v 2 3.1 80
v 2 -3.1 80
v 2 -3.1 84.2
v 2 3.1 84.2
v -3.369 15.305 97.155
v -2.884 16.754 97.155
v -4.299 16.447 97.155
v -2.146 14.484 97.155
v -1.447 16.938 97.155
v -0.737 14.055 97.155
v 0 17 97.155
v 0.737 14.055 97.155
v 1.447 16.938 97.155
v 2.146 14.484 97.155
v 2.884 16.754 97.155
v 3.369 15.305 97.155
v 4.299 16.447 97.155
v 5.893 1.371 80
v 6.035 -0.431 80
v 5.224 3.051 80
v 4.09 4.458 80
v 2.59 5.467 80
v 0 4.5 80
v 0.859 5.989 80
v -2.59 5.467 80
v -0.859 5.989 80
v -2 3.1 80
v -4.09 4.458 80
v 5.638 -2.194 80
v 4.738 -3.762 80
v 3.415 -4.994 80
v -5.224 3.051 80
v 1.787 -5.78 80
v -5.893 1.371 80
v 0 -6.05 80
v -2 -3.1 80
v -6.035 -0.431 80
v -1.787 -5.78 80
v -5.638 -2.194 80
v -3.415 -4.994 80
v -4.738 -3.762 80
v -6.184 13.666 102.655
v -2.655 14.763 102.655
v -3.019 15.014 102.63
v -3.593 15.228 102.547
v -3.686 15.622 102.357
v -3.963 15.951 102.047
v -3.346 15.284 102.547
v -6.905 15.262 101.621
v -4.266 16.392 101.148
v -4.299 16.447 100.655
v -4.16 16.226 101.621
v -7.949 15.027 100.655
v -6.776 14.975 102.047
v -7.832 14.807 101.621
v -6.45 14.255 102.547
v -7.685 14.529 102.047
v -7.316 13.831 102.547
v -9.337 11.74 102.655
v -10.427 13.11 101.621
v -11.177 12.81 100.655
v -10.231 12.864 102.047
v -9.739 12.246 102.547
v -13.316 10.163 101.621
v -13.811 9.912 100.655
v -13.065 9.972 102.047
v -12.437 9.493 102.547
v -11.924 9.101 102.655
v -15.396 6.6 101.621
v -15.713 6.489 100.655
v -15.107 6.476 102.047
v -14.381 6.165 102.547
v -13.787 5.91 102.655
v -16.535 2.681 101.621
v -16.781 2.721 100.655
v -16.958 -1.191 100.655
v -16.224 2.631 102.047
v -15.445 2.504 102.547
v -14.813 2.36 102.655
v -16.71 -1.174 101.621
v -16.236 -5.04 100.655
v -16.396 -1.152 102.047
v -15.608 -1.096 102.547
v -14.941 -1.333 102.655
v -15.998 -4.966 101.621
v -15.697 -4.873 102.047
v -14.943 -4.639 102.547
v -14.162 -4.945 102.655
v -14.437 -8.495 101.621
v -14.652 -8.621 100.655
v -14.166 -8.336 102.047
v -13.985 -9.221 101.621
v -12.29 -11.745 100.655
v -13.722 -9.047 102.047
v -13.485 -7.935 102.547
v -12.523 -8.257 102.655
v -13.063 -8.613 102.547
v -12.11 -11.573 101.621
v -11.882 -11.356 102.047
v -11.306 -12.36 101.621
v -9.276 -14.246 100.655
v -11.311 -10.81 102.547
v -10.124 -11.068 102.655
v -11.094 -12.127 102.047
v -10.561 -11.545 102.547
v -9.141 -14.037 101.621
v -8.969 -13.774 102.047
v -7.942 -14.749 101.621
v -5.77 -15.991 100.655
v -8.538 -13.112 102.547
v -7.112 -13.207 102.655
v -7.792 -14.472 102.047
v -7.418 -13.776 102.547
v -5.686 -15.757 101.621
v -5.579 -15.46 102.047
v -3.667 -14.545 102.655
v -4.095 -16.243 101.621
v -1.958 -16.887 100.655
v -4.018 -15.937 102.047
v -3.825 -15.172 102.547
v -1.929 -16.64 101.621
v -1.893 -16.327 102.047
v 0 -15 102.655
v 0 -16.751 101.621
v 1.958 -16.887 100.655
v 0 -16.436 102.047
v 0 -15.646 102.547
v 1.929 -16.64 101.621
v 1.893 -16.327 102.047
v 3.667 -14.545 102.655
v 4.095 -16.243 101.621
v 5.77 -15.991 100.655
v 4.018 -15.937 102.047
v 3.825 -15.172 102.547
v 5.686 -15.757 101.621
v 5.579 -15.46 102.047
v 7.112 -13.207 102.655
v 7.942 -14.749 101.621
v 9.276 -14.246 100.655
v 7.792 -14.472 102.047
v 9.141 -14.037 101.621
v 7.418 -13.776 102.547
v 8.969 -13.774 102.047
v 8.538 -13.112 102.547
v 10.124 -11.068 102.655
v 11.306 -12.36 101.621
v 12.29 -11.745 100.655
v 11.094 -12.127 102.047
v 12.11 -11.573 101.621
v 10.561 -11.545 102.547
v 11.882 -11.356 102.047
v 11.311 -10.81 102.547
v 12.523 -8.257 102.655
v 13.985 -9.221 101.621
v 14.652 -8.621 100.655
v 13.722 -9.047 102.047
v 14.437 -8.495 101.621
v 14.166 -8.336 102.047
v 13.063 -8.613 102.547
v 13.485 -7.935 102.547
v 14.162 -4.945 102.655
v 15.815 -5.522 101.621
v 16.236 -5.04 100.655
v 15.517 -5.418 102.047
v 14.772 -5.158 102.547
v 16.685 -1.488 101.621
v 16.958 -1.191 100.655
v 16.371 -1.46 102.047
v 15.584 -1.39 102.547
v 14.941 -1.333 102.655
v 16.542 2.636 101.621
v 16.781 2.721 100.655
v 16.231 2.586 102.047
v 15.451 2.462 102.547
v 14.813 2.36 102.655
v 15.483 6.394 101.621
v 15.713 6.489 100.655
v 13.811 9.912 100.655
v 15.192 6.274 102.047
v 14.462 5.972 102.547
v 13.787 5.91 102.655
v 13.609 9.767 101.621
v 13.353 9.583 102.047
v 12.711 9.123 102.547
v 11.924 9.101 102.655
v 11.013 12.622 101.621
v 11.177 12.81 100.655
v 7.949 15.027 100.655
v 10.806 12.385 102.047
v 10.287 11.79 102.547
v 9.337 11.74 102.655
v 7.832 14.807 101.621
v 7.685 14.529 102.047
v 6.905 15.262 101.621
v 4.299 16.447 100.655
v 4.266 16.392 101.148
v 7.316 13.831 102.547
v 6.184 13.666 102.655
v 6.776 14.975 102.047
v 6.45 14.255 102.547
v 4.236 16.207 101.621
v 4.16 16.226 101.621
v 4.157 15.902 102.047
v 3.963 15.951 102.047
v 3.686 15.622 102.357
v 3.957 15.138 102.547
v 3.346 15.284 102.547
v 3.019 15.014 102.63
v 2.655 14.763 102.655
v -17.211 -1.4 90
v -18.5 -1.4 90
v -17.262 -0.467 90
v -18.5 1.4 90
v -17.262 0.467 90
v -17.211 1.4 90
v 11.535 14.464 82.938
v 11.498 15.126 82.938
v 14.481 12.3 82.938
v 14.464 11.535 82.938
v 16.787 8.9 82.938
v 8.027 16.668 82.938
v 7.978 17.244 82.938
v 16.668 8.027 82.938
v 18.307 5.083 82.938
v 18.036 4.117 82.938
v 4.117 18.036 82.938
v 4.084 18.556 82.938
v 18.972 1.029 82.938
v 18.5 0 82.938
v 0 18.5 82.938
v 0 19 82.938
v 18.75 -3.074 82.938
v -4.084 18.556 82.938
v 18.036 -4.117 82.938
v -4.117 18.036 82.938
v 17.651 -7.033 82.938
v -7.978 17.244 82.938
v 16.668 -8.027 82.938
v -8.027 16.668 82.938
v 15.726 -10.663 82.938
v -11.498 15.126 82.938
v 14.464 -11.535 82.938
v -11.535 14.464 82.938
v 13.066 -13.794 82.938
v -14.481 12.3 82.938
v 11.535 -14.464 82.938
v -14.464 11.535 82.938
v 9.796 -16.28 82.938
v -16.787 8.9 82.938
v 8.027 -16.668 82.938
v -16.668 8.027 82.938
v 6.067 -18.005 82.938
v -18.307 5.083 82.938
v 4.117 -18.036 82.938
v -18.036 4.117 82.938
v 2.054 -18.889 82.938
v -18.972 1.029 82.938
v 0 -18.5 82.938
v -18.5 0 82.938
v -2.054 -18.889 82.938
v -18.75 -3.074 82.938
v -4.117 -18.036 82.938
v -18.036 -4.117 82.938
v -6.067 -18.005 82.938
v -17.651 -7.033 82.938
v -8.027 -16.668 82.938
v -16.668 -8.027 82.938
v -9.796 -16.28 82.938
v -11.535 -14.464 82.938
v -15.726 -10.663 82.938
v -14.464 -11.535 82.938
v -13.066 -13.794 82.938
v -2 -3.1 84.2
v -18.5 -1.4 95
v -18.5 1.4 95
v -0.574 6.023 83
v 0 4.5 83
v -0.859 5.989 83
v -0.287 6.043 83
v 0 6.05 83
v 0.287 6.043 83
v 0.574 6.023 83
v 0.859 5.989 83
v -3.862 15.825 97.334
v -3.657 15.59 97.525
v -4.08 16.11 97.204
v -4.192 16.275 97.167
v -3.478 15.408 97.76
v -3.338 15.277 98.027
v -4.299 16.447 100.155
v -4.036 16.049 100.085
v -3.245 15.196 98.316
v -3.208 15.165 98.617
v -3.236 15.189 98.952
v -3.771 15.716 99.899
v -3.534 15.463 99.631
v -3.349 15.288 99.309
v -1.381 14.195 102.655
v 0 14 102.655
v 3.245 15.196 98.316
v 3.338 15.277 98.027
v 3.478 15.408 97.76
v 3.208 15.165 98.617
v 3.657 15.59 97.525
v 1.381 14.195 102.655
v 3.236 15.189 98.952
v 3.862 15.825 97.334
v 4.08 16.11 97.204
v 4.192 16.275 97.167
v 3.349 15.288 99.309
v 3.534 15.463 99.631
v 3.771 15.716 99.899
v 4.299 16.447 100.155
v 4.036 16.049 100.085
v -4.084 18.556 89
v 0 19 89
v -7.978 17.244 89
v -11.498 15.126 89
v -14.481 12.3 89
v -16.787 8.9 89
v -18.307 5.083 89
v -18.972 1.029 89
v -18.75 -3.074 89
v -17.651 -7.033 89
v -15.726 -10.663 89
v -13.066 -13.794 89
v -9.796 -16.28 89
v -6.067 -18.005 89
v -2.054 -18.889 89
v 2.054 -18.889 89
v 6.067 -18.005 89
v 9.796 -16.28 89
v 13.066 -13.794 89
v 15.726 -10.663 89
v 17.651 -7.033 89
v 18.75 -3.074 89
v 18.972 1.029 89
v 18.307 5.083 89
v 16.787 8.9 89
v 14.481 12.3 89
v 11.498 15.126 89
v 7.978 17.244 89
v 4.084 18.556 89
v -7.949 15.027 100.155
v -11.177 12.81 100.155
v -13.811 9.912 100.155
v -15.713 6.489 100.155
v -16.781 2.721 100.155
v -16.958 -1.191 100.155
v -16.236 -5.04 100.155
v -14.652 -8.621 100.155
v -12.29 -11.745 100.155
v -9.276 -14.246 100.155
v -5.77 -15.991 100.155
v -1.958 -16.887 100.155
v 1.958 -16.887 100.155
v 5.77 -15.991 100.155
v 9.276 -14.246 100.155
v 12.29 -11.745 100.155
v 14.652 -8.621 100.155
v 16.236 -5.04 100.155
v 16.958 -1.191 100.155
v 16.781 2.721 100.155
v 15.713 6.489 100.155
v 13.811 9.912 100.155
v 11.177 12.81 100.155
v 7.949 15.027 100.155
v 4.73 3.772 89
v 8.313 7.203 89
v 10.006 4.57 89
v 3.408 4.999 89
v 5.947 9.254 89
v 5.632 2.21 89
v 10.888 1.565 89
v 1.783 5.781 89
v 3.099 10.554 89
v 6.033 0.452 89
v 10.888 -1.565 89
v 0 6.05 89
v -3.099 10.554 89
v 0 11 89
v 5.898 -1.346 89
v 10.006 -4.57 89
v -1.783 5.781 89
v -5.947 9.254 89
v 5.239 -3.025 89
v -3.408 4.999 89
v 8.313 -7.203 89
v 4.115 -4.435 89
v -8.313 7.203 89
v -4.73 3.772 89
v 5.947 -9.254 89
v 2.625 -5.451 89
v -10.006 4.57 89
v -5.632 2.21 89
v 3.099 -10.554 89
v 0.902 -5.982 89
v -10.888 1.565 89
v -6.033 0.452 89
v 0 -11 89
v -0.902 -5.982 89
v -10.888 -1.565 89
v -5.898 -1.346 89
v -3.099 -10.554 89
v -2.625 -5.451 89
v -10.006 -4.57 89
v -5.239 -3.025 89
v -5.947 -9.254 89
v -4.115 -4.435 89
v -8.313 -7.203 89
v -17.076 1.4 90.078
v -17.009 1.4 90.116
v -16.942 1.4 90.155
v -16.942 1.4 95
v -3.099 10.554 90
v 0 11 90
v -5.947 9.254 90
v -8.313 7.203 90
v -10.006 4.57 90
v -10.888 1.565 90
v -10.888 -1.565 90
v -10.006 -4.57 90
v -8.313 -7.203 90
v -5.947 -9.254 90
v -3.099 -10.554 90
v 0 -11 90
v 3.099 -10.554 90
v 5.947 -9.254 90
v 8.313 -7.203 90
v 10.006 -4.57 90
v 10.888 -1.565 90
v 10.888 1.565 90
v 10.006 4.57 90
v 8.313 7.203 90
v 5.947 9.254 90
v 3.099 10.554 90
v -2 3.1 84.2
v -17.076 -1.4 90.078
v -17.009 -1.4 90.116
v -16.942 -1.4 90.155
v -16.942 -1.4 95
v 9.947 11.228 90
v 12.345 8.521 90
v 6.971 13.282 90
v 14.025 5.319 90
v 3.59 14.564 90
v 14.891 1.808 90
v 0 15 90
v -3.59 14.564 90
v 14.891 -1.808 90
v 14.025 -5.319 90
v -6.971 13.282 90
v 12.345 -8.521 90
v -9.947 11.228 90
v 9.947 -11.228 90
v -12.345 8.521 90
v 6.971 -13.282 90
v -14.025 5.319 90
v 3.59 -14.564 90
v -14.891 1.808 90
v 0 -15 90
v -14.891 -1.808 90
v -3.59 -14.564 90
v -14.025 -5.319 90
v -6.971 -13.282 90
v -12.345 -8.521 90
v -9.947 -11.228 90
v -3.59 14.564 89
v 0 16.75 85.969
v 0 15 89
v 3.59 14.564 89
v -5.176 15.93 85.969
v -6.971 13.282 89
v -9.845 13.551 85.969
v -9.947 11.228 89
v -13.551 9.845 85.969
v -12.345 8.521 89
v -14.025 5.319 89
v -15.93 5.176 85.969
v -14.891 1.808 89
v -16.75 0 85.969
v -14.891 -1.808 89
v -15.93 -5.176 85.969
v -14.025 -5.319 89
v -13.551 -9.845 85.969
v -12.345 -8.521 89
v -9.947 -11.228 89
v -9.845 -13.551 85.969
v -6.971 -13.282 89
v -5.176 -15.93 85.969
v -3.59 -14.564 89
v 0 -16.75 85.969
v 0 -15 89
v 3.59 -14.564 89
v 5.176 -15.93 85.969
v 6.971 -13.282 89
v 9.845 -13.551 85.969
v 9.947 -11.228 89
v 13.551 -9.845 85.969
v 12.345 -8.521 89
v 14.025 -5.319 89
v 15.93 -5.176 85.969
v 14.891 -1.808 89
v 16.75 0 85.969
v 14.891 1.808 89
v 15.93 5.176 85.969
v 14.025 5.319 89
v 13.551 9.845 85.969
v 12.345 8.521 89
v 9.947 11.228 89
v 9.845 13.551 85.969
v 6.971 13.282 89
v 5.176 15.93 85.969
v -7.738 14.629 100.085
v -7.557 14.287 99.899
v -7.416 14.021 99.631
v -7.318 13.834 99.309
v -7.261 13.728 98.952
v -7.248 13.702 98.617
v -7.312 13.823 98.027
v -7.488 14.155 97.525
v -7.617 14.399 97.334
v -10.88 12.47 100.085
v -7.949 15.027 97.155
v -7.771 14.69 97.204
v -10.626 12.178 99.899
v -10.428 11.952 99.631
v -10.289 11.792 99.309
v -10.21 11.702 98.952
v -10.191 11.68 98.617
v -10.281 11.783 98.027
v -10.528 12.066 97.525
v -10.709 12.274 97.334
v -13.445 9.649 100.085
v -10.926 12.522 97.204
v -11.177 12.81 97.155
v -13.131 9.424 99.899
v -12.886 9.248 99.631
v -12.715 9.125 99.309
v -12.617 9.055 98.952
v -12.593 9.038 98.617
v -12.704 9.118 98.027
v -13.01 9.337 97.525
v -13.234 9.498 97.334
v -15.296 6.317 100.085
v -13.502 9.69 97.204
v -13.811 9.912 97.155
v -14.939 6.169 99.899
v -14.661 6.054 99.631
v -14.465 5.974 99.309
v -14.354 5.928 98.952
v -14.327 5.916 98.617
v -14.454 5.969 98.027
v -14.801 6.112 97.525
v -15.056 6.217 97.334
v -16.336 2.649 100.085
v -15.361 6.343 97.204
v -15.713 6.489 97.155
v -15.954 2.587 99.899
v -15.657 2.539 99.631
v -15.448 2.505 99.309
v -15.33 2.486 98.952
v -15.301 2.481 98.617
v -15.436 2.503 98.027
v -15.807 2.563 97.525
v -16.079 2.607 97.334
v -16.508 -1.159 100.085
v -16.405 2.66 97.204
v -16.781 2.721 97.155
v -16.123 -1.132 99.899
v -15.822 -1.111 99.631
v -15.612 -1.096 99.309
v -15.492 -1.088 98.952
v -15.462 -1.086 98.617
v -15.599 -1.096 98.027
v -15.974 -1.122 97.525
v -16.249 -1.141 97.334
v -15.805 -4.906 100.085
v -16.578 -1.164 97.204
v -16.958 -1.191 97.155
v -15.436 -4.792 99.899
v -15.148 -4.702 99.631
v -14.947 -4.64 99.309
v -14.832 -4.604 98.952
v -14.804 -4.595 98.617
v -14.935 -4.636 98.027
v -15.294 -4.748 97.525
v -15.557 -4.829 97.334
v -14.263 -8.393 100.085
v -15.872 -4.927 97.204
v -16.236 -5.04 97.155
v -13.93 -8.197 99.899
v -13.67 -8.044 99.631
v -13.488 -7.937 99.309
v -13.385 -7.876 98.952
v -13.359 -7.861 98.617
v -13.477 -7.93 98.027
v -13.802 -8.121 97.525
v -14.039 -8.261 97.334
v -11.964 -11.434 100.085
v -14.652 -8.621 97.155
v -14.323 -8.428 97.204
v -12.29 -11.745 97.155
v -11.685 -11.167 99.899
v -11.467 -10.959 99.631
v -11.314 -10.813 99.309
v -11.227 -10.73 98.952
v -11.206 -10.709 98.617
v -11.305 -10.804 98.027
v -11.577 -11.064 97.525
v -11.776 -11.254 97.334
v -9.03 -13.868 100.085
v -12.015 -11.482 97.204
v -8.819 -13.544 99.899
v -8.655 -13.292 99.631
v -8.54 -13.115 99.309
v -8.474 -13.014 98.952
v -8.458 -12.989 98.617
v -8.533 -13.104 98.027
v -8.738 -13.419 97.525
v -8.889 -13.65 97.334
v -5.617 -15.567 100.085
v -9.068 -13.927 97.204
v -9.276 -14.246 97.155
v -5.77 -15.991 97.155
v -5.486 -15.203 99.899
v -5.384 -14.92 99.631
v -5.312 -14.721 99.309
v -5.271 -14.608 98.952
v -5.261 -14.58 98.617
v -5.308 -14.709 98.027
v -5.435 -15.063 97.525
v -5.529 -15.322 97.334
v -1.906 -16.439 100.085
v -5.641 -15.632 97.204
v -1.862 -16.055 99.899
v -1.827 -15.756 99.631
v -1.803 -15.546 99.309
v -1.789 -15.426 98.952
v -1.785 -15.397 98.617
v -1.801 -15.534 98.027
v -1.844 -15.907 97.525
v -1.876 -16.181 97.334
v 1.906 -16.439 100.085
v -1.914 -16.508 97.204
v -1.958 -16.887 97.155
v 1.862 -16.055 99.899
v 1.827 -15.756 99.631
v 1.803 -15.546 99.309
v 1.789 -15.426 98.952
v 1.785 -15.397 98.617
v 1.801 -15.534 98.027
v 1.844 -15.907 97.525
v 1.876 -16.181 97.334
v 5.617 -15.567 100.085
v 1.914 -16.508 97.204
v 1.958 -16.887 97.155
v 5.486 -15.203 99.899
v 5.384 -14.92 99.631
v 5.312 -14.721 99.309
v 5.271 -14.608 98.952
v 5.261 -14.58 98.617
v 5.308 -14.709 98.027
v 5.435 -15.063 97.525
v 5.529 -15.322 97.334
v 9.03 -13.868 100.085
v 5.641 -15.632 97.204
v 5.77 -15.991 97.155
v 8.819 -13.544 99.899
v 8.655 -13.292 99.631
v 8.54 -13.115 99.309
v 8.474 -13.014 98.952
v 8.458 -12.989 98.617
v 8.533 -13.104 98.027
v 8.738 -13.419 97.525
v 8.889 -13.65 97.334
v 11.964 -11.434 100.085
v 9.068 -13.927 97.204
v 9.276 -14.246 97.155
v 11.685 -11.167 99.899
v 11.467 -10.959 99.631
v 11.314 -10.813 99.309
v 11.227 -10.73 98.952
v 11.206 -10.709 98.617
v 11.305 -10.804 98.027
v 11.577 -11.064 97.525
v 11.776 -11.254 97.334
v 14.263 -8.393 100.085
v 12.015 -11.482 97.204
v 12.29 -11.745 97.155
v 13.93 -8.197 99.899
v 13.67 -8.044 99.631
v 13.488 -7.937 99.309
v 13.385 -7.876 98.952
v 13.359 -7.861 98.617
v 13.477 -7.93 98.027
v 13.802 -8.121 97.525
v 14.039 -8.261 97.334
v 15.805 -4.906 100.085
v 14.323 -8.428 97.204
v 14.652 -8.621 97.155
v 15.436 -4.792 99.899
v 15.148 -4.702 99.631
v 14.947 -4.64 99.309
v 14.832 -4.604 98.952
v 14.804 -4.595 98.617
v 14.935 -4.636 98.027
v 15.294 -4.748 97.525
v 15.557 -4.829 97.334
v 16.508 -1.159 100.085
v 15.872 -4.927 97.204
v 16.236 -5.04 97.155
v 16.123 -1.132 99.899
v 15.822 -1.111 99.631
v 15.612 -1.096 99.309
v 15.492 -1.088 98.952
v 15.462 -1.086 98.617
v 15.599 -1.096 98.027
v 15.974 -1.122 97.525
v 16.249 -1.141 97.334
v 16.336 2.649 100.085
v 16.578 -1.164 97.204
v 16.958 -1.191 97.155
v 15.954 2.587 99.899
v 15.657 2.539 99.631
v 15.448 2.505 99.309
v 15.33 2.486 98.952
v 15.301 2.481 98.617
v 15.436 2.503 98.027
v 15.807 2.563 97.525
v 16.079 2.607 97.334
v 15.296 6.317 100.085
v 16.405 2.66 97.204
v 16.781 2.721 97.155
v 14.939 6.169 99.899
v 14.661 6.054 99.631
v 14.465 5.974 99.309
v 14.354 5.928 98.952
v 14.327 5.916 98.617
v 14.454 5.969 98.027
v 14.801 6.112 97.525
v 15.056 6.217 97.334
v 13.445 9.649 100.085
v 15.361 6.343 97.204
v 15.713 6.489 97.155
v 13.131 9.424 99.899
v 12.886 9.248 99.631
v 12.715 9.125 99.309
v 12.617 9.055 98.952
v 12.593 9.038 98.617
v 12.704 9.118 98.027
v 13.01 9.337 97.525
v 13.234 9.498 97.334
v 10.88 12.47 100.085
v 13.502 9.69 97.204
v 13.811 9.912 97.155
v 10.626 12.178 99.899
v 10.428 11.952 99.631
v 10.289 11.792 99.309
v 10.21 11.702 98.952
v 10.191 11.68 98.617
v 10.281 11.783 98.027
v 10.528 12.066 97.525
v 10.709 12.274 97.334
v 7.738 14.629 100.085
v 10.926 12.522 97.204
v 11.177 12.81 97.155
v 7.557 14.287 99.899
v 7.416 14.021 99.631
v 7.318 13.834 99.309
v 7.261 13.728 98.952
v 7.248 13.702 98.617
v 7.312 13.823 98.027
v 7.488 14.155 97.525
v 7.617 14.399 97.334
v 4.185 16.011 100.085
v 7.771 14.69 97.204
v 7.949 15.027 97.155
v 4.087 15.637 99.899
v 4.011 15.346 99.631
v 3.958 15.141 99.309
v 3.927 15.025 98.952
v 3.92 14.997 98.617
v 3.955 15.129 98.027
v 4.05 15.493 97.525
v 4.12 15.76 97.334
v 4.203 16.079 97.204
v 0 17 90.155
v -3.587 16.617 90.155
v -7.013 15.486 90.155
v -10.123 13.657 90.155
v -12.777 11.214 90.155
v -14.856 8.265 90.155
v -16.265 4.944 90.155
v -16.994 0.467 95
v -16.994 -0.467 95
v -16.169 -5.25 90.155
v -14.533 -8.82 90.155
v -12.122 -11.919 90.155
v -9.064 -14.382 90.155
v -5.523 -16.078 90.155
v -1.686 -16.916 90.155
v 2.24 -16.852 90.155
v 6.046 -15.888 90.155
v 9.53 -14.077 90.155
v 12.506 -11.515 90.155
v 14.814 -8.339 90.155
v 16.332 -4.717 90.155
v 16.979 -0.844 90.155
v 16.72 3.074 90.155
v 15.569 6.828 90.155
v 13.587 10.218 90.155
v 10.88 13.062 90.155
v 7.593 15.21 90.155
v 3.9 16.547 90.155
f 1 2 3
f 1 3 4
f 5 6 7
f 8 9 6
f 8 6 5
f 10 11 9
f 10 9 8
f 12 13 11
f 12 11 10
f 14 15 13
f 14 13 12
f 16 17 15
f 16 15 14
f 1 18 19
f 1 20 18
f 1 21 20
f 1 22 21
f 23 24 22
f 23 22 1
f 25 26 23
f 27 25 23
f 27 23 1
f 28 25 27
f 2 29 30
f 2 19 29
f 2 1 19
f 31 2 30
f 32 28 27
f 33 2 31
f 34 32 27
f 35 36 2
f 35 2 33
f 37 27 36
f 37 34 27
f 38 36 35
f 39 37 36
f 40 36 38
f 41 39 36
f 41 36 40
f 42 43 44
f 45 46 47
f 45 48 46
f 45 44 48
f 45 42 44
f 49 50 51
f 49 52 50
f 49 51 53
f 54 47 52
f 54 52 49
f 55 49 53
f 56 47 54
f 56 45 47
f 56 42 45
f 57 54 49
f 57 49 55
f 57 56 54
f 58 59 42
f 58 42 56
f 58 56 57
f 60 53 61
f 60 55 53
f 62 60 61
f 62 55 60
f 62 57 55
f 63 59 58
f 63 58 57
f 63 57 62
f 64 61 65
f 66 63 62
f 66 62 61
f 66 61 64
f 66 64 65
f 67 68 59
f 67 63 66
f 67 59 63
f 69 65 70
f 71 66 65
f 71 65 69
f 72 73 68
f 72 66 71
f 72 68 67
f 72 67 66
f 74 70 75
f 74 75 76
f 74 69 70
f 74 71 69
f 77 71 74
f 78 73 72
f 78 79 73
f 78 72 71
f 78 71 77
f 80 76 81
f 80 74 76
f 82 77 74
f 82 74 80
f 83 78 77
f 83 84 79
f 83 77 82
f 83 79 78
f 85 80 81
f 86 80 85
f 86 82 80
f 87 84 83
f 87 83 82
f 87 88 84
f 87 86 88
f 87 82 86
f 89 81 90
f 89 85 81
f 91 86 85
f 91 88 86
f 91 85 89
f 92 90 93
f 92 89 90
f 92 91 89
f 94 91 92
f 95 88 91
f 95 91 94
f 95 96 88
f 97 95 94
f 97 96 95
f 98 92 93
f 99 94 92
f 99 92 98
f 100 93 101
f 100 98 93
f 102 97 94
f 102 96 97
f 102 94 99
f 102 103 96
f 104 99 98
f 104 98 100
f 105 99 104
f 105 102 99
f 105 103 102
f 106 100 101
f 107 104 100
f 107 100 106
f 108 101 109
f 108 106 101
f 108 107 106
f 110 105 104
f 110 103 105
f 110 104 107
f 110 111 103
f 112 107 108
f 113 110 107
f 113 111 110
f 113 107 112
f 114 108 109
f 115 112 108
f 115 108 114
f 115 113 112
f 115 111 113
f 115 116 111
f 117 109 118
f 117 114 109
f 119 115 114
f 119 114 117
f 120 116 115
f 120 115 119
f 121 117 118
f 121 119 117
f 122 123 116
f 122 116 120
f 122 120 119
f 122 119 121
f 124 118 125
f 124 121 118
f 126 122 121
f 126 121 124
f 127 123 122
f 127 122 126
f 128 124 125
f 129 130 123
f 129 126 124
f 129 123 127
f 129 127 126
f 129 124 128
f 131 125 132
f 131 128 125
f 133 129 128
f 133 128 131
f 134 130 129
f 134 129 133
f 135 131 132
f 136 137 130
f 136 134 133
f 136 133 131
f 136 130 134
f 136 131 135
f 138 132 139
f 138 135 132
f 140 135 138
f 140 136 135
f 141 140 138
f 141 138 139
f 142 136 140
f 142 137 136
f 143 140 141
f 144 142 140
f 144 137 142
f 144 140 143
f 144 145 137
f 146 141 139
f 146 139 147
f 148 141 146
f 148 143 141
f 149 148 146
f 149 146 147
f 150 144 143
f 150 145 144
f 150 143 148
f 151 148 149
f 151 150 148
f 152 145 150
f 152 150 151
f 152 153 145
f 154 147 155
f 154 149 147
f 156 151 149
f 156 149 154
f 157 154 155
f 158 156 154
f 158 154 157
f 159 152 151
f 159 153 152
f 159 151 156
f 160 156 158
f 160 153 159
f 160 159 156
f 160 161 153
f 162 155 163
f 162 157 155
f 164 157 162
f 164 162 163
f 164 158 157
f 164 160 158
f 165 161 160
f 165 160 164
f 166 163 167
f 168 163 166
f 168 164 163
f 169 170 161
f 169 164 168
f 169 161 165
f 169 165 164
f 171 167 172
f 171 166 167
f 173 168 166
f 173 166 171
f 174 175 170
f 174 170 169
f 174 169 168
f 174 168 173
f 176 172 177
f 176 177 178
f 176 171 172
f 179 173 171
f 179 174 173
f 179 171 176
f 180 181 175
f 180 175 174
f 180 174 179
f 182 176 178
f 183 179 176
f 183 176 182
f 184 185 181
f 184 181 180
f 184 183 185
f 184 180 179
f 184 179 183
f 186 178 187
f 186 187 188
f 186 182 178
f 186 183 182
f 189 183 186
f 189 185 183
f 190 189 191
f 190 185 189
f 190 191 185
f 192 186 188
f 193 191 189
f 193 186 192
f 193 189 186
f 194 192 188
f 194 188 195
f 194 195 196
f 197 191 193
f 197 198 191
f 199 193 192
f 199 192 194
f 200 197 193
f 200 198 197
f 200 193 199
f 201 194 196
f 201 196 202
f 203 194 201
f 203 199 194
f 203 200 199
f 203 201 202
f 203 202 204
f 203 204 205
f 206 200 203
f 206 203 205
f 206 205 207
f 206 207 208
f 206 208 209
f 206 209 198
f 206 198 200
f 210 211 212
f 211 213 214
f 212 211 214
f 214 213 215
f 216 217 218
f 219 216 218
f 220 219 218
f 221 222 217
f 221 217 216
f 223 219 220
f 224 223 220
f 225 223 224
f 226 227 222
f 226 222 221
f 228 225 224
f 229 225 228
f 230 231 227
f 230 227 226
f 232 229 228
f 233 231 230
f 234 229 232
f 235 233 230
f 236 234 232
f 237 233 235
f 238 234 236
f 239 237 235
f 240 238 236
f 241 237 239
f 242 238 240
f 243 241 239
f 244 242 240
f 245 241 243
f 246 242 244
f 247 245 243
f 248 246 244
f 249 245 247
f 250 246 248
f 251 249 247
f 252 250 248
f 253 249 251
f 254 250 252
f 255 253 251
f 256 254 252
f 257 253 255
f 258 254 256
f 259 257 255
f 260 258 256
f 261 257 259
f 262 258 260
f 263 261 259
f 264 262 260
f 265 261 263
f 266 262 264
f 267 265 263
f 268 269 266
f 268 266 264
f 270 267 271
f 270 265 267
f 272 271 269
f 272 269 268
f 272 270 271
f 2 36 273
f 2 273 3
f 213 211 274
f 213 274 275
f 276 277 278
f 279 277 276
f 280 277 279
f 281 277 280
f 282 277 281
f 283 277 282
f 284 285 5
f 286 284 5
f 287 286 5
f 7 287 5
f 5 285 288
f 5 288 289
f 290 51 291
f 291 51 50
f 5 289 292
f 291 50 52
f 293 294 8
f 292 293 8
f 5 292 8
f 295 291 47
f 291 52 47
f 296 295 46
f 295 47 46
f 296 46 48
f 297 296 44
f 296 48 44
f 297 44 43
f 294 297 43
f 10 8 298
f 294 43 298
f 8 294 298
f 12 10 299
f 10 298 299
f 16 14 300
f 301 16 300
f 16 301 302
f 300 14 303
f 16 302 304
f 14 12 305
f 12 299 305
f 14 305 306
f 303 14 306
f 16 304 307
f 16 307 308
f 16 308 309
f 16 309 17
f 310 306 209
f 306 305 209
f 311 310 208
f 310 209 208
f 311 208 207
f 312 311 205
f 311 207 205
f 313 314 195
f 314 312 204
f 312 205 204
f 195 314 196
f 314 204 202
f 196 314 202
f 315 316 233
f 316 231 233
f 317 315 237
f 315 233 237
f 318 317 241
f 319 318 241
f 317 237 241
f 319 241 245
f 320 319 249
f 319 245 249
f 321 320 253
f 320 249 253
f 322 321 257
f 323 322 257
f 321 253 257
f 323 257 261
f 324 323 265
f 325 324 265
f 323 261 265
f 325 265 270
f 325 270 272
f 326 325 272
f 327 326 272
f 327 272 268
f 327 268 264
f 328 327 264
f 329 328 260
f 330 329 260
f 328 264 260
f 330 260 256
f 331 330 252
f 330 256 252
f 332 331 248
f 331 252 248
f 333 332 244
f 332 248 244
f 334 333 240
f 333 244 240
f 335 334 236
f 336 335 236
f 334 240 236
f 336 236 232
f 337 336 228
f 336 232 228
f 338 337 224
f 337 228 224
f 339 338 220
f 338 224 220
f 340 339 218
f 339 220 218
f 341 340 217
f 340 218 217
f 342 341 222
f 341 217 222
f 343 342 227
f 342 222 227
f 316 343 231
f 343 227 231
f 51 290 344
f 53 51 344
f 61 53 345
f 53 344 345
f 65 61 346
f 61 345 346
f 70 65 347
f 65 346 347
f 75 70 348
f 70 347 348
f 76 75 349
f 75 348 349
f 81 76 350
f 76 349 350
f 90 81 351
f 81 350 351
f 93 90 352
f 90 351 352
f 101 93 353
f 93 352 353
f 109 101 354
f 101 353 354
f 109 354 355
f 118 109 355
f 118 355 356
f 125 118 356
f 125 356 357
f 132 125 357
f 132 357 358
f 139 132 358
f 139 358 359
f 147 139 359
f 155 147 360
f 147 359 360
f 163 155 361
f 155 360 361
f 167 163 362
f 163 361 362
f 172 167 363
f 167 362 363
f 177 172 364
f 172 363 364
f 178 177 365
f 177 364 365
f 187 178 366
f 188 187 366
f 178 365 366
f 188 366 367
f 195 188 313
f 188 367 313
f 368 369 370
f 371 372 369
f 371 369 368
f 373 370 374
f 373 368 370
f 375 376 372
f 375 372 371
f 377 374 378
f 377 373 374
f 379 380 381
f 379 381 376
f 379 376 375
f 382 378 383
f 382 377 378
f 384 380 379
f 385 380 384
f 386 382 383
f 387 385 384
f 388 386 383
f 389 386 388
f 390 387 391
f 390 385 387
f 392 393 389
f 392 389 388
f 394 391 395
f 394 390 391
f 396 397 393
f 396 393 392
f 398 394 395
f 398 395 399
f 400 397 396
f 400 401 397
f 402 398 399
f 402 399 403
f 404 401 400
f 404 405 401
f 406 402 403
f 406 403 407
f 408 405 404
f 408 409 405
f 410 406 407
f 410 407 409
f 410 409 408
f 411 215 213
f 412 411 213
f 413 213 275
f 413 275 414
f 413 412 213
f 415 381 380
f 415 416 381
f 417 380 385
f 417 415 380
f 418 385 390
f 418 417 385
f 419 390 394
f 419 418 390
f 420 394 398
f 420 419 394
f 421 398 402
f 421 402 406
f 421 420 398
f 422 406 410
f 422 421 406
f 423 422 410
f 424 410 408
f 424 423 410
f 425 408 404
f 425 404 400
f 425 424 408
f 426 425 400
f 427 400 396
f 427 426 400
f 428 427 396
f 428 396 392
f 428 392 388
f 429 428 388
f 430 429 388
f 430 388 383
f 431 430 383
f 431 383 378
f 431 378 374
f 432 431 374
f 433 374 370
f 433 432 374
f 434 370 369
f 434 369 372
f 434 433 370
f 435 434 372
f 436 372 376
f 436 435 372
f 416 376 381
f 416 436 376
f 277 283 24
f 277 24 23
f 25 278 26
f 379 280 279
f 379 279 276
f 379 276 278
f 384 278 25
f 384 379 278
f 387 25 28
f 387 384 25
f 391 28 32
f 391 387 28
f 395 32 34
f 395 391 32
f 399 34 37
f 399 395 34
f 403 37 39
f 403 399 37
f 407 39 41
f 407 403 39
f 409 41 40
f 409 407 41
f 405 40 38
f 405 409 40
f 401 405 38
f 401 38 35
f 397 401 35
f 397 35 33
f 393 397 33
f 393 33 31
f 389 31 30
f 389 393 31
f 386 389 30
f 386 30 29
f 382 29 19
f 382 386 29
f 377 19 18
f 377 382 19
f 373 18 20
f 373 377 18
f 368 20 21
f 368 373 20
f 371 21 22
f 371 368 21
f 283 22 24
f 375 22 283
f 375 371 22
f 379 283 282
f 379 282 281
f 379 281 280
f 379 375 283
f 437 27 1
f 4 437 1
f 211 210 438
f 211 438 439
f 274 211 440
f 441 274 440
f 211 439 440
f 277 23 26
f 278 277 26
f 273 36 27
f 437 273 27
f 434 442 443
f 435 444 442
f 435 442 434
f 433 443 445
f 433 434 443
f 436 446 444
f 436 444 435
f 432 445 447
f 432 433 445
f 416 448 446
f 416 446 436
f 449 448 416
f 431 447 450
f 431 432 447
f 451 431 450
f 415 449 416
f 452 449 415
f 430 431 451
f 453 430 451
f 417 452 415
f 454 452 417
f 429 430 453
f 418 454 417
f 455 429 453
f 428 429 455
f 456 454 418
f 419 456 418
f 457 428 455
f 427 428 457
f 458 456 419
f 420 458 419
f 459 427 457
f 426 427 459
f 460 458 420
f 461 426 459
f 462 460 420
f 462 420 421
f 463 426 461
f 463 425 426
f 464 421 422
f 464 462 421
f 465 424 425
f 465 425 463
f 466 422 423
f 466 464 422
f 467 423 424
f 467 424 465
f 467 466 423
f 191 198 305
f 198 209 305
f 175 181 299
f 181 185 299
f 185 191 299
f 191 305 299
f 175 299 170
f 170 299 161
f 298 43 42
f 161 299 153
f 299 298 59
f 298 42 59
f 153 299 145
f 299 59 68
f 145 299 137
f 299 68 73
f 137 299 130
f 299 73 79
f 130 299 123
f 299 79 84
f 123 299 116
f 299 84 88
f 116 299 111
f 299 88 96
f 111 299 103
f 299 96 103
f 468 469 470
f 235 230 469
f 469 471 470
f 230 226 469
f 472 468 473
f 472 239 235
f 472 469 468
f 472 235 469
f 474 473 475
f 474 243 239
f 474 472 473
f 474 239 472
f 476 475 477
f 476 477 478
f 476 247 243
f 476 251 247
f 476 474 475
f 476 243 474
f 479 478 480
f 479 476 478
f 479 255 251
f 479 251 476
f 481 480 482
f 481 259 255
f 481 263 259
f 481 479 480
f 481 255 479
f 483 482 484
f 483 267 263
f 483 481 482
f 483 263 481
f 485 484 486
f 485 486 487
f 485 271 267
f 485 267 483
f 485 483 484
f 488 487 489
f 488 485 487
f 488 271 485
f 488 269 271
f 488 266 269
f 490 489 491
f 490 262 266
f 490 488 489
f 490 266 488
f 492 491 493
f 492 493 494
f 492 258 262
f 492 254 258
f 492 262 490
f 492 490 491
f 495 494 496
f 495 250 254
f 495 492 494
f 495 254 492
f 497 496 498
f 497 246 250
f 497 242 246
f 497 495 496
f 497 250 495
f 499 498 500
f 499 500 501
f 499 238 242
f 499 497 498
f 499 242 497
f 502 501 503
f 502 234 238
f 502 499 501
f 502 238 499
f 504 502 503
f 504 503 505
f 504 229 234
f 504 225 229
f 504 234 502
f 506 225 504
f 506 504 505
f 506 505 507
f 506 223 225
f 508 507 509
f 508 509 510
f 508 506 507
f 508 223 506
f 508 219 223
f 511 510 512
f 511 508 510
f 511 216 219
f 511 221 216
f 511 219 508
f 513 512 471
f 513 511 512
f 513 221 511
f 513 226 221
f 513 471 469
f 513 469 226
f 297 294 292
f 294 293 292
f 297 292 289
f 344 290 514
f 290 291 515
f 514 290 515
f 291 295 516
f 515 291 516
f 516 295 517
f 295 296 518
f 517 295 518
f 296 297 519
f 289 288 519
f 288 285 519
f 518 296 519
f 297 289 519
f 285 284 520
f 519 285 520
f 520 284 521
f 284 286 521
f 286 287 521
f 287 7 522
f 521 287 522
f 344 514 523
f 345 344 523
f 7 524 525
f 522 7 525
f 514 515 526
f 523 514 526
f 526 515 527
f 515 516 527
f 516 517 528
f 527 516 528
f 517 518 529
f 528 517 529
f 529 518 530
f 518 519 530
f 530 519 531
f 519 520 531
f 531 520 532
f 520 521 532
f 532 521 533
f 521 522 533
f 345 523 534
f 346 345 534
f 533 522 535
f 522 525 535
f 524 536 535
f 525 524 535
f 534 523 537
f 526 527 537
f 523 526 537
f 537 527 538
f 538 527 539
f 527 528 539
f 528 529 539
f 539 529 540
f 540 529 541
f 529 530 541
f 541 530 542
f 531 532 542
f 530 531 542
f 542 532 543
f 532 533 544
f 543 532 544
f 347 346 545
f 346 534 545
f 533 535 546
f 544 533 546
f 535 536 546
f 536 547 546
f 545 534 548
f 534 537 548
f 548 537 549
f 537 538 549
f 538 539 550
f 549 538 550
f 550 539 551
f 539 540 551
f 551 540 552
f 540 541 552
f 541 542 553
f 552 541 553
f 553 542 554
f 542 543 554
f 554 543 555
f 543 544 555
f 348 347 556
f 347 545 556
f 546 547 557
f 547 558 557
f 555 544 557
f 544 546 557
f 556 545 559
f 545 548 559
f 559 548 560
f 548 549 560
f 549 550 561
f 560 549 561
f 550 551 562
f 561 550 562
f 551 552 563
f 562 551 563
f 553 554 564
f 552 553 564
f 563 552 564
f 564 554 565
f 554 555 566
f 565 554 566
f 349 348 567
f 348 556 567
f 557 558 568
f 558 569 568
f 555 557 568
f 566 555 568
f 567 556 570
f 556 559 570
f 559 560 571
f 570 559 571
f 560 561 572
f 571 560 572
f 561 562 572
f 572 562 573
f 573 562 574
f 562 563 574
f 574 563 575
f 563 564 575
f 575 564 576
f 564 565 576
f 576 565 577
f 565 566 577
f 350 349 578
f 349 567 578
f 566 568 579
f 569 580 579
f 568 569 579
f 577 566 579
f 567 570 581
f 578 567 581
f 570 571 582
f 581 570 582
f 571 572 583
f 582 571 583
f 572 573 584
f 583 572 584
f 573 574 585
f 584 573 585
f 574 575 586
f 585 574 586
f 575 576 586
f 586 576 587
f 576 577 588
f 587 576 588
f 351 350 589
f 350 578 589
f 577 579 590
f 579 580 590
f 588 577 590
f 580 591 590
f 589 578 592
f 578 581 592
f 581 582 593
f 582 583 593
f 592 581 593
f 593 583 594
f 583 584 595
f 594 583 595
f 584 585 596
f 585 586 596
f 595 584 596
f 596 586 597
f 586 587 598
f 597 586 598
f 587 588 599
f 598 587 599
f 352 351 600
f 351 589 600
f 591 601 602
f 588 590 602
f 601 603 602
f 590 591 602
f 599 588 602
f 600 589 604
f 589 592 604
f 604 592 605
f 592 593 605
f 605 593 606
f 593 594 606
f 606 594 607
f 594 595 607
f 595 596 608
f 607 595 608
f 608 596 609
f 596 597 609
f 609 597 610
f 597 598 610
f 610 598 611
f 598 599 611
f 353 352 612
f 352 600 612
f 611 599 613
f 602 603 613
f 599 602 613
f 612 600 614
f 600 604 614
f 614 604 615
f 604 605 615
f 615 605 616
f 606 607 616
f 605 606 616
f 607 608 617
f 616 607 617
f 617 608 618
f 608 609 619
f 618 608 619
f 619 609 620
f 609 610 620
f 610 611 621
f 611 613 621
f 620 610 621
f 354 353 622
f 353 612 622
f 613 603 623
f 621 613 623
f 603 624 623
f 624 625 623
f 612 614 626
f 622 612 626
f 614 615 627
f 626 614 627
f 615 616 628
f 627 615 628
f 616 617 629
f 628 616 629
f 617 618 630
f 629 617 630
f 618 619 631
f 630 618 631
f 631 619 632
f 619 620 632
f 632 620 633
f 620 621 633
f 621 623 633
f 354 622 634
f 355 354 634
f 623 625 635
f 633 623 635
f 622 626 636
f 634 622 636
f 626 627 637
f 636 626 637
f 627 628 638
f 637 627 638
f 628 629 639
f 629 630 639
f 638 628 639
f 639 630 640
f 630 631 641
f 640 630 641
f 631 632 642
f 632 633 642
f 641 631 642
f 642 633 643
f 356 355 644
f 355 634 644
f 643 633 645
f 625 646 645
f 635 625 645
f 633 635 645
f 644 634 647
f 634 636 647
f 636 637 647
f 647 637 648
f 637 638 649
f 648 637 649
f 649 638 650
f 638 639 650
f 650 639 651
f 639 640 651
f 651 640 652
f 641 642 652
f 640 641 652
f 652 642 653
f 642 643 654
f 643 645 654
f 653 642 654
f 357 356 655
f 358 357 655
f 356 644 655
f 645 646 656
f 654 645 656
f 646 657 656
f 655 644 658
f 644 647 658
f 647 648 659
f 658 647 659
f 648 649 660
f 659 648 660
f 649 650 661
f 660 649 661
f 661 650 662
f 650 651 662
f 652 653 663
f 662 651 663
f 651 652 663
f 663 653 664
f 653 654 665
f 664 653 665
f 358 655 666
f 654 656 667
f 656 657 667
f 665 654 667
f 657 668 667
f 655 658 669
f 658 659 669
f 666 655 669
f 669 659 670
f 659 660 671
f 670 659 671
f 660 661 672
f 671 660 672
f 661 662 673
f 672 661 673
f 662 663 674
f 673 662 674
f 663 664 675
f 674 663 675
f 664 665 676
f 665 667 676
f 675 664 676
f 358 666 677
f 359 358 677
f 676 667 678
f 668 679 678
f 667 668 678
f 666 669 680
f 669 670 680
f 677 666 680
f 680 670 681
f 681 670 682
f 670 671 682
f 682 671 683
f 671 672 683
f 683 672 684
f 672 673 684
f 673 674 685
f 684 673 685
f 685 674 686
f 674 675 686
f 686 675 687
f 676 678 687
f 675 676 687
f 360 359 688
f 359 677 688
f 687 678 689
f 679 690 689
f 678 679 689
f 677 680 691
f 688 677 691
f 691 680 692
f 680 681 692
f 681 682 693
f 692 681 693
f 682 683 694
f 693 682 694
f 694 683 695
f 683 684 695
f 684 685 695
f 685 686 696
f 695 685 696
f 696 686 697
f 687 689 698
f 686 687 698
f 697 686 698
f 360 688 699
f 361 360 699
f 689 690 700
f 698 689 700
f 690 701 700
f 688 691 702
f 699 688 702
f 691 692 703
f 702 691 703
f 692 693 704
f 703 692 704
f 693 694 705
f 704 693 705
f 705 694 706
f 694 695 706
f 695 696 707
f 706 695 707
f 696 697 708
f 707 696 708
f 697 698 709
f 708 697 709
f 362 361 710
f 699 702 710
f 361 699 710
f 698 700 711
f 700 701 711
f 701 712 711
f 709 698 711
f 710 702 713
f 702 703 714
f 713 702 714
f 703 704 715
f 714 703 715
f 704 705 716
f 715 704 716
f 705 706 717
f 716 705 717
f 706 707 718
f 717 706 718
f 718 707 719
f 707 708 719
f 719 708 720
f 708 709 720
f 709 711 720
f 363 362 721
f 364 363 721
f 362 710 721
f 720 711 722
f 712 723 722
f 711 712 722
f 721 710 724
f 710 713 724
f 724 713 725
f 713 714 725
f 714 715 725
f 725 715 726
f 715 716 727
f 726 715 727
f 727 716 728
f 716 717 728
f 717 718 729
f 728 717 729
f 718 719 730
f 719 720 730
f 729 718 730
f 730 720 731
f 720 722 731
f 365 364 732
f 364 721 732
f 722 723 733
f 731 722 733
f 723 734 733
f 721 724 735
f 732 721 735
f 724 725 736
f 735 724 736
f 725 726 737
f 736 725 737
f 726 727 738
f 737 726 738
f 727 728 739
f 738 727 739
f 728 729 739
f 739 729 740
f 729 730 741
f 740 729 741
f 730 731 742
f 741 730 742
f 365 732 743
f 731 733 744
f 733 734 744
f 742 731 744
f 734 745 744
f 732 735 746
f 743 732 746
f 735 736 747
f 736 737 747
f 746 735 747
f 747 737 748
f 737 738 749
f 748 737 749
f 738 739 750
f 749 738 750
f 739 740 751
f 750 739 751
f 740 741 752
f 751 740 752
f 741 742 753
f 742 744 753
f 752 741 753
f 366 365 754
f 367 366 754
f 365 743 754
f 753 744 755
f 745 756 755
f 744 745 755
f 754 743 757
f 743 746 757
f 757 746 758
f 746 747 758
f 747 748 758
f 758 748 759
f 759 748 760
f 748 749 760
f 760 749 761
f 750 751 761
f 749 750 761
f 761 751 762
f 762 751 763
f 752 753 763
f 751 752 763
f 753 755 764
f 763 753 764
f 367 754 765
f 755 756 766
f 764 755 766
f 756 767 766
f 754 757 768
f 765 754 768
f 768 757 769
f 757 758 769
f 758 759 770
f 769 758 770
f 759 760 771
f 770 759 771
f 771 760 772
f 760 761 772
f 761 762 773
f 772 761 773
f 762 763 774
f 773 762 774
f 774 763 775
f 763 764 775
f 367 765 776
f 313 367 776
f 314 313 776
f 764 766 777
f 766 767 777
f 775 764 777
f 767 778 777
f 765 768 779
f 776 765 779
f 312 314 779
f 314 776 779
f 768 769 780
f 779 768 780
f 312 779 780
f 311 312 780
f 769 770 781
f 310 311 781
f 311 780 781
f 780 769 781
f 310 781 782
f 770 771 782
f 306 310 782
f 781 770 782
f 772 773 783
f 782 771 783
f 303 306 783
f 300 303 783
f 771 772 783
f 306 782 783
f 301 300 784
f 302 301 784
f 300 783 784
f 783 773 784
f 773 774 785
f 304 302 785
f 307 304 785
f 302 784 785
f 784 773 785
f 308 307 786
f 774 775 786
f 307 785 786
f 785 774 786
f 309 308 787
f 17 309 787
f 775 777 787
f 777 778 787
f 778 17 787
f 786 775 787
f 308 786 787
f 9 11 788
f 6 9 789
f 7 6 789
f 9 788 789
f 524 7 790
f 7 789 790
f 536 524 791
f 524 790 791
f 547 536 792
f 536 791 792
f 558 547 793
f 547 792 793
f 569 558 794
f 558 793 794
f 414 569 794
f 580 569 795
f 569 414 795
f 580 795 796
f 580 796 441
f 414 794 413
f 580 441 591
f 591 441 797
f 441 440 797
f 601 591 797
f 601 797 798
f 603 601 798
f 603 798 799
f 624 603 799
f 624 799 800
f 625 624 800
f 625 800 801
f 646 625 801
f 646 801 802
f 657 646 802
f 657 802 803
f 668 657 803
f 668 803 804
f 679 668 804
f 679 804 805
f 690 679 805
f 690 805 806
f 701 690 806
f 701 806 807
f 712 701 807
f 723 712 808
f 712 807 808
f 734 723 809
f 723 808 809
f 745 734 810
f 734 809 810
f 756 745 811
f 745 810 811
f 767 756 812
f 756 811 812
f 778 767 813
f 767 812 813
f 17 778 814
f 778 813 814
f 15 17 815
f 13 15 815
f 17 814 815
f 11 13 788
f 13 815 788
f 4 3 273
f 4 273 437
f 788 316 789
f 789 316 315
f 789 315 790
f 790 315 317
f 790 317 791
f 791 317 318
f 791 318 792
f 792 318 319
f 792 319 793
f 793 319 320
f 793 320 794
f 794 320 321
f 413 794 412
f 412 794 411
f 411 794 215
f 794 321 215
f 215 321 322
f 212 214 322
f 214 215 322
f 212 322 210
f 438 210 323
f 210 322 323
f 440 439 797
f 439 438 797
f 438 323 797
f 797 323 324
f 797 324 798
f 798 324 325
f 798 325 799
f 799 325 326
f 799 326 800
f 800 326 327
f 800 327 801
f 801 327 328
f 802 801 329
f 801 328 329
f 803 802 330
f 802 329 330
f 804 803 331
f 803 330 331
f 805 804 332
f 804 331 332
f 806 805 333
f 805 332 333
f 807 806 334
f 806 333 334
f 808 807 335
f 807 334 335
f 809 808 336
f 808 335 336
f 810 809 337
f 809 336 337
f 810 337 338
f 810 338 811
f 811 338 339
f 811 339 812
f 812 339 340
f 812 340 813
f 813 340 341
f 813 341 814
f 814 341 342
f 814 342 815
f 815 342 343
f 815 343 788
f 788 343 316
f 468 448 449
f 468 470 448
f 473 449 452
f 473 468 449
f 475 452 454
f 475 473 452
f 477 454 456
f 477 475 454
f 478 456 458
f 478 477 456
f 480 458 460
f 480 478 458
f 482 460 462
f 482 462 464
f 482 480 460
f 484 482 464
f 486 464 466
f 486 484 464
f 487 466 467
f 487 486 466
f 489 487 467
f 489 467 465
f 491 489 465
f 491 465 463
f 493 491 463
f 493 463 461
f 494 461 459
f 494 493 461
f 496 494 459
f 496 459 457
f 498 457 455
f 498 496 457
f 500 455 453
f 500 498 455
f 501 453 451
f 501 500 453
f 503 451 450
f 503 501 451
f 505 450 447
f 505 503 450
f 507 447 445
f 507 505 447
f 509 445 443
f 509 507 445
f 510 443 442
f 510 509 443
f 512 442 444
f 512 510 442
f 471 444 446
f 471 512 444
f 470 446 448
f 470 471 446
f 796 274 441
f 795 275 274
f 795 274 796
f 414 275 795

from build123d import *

# Parameters (mm, degrees)
SKETCH064_W     = 6.2
SKETCH064_H     = 4
POCKET005_DEPTH = 4.2
SKETCH093_W     = 3
SKETCH093_H     = 2.8
PAD011_DEPTH    = 5
SKETCH101_R     = 5
POCKET022_DEPTH = 5.5
POCKET055_DEPTH = 3


with BuildPart() as part:
    # Sketch063 → Revolution016 (revolve)
    with BuildSketch(Plane.YZ):
        with BuildLine():
            Line((6.05, 9), (11, 9))
            Line((11, 9), (11, 10))
            Line((11, 10), (15, 10))
            Line((15, 10), (15, 9))
            Line((15, 9), (18.5, 2.937822))
            Line((18.5, 2.937822), (19, 2.937822))
            Line((19, 9), (19, 2.937822))
            Line((17, 10.154701), (19, 9))
            Line((17, 17.154701), (17, 10.154701))
            ThreePointArc((17, 20.154701), (15.5, 18.654701), (17, 17.154701))
            Line((17, 20.654701), (17, 20.154701))
            ThreePointArc((17, 20.654701), (16.414214, 22.068914), (15, 22.654701))
            Line((0, 22.654701), (15, 22.654701))
            Line((0, 22.654701), (0, 0))
            Line((0, 0), (6.05, 0))
            Line((6.05, 0), (6.05, 9))
        make_face()
    revolve(axis=Axis((0, 0, 0), (0, 0, 1)))

    # Sketch064 (on Face1 of Revolution016) → Pocket005 (cut)
    with BuildSketch(Plane.YX):
        Rectangle(SKETCH064_W, SKETCH064_H)
    extrude(amount=-POCKET005_DEPTH, mode=Mode.SUBTRACT)

    # Sketch093 → Pad011 (join)
    with BuildSketch(Plane.XY.offset(10)):
        with Locations((-17, 0)):
            Rectangle(SKETCH093_W, SKETCH093_H)
    extrude(amount=PAD011_DEPTH)

    # Sketch101 (on Face25 of Pad011) → Pocket022 (cut)
    with BuildSketch(Plane(origin=(0, 0, 22.654701), x_dir=(0, -1, 0), z_dir=(0, 0, 1))):
        with Locations((-19, 0)):
            Circle(SKETCH101_R)
    extrude(amount=-POCKET022_DEPTH, mode=Mode.SUBTRACT)

    # Sketch174 (on Face1 of Revolution016) → Pocket055 (cut)
    with BuildSketch(Plane.YX):
        Polygon((6.75, 1.299038), (4.5, 0), (6.75, -1.299038), align=None)
    extrude(amount=-POCKET055_DEPTH, mode=Mode.SUBTRACT)


with BuildPart() as part_1:
    # Body017 placement: moved
    add(part.part.moved(Location((0, 0, 80))))


solid = part_1.part
